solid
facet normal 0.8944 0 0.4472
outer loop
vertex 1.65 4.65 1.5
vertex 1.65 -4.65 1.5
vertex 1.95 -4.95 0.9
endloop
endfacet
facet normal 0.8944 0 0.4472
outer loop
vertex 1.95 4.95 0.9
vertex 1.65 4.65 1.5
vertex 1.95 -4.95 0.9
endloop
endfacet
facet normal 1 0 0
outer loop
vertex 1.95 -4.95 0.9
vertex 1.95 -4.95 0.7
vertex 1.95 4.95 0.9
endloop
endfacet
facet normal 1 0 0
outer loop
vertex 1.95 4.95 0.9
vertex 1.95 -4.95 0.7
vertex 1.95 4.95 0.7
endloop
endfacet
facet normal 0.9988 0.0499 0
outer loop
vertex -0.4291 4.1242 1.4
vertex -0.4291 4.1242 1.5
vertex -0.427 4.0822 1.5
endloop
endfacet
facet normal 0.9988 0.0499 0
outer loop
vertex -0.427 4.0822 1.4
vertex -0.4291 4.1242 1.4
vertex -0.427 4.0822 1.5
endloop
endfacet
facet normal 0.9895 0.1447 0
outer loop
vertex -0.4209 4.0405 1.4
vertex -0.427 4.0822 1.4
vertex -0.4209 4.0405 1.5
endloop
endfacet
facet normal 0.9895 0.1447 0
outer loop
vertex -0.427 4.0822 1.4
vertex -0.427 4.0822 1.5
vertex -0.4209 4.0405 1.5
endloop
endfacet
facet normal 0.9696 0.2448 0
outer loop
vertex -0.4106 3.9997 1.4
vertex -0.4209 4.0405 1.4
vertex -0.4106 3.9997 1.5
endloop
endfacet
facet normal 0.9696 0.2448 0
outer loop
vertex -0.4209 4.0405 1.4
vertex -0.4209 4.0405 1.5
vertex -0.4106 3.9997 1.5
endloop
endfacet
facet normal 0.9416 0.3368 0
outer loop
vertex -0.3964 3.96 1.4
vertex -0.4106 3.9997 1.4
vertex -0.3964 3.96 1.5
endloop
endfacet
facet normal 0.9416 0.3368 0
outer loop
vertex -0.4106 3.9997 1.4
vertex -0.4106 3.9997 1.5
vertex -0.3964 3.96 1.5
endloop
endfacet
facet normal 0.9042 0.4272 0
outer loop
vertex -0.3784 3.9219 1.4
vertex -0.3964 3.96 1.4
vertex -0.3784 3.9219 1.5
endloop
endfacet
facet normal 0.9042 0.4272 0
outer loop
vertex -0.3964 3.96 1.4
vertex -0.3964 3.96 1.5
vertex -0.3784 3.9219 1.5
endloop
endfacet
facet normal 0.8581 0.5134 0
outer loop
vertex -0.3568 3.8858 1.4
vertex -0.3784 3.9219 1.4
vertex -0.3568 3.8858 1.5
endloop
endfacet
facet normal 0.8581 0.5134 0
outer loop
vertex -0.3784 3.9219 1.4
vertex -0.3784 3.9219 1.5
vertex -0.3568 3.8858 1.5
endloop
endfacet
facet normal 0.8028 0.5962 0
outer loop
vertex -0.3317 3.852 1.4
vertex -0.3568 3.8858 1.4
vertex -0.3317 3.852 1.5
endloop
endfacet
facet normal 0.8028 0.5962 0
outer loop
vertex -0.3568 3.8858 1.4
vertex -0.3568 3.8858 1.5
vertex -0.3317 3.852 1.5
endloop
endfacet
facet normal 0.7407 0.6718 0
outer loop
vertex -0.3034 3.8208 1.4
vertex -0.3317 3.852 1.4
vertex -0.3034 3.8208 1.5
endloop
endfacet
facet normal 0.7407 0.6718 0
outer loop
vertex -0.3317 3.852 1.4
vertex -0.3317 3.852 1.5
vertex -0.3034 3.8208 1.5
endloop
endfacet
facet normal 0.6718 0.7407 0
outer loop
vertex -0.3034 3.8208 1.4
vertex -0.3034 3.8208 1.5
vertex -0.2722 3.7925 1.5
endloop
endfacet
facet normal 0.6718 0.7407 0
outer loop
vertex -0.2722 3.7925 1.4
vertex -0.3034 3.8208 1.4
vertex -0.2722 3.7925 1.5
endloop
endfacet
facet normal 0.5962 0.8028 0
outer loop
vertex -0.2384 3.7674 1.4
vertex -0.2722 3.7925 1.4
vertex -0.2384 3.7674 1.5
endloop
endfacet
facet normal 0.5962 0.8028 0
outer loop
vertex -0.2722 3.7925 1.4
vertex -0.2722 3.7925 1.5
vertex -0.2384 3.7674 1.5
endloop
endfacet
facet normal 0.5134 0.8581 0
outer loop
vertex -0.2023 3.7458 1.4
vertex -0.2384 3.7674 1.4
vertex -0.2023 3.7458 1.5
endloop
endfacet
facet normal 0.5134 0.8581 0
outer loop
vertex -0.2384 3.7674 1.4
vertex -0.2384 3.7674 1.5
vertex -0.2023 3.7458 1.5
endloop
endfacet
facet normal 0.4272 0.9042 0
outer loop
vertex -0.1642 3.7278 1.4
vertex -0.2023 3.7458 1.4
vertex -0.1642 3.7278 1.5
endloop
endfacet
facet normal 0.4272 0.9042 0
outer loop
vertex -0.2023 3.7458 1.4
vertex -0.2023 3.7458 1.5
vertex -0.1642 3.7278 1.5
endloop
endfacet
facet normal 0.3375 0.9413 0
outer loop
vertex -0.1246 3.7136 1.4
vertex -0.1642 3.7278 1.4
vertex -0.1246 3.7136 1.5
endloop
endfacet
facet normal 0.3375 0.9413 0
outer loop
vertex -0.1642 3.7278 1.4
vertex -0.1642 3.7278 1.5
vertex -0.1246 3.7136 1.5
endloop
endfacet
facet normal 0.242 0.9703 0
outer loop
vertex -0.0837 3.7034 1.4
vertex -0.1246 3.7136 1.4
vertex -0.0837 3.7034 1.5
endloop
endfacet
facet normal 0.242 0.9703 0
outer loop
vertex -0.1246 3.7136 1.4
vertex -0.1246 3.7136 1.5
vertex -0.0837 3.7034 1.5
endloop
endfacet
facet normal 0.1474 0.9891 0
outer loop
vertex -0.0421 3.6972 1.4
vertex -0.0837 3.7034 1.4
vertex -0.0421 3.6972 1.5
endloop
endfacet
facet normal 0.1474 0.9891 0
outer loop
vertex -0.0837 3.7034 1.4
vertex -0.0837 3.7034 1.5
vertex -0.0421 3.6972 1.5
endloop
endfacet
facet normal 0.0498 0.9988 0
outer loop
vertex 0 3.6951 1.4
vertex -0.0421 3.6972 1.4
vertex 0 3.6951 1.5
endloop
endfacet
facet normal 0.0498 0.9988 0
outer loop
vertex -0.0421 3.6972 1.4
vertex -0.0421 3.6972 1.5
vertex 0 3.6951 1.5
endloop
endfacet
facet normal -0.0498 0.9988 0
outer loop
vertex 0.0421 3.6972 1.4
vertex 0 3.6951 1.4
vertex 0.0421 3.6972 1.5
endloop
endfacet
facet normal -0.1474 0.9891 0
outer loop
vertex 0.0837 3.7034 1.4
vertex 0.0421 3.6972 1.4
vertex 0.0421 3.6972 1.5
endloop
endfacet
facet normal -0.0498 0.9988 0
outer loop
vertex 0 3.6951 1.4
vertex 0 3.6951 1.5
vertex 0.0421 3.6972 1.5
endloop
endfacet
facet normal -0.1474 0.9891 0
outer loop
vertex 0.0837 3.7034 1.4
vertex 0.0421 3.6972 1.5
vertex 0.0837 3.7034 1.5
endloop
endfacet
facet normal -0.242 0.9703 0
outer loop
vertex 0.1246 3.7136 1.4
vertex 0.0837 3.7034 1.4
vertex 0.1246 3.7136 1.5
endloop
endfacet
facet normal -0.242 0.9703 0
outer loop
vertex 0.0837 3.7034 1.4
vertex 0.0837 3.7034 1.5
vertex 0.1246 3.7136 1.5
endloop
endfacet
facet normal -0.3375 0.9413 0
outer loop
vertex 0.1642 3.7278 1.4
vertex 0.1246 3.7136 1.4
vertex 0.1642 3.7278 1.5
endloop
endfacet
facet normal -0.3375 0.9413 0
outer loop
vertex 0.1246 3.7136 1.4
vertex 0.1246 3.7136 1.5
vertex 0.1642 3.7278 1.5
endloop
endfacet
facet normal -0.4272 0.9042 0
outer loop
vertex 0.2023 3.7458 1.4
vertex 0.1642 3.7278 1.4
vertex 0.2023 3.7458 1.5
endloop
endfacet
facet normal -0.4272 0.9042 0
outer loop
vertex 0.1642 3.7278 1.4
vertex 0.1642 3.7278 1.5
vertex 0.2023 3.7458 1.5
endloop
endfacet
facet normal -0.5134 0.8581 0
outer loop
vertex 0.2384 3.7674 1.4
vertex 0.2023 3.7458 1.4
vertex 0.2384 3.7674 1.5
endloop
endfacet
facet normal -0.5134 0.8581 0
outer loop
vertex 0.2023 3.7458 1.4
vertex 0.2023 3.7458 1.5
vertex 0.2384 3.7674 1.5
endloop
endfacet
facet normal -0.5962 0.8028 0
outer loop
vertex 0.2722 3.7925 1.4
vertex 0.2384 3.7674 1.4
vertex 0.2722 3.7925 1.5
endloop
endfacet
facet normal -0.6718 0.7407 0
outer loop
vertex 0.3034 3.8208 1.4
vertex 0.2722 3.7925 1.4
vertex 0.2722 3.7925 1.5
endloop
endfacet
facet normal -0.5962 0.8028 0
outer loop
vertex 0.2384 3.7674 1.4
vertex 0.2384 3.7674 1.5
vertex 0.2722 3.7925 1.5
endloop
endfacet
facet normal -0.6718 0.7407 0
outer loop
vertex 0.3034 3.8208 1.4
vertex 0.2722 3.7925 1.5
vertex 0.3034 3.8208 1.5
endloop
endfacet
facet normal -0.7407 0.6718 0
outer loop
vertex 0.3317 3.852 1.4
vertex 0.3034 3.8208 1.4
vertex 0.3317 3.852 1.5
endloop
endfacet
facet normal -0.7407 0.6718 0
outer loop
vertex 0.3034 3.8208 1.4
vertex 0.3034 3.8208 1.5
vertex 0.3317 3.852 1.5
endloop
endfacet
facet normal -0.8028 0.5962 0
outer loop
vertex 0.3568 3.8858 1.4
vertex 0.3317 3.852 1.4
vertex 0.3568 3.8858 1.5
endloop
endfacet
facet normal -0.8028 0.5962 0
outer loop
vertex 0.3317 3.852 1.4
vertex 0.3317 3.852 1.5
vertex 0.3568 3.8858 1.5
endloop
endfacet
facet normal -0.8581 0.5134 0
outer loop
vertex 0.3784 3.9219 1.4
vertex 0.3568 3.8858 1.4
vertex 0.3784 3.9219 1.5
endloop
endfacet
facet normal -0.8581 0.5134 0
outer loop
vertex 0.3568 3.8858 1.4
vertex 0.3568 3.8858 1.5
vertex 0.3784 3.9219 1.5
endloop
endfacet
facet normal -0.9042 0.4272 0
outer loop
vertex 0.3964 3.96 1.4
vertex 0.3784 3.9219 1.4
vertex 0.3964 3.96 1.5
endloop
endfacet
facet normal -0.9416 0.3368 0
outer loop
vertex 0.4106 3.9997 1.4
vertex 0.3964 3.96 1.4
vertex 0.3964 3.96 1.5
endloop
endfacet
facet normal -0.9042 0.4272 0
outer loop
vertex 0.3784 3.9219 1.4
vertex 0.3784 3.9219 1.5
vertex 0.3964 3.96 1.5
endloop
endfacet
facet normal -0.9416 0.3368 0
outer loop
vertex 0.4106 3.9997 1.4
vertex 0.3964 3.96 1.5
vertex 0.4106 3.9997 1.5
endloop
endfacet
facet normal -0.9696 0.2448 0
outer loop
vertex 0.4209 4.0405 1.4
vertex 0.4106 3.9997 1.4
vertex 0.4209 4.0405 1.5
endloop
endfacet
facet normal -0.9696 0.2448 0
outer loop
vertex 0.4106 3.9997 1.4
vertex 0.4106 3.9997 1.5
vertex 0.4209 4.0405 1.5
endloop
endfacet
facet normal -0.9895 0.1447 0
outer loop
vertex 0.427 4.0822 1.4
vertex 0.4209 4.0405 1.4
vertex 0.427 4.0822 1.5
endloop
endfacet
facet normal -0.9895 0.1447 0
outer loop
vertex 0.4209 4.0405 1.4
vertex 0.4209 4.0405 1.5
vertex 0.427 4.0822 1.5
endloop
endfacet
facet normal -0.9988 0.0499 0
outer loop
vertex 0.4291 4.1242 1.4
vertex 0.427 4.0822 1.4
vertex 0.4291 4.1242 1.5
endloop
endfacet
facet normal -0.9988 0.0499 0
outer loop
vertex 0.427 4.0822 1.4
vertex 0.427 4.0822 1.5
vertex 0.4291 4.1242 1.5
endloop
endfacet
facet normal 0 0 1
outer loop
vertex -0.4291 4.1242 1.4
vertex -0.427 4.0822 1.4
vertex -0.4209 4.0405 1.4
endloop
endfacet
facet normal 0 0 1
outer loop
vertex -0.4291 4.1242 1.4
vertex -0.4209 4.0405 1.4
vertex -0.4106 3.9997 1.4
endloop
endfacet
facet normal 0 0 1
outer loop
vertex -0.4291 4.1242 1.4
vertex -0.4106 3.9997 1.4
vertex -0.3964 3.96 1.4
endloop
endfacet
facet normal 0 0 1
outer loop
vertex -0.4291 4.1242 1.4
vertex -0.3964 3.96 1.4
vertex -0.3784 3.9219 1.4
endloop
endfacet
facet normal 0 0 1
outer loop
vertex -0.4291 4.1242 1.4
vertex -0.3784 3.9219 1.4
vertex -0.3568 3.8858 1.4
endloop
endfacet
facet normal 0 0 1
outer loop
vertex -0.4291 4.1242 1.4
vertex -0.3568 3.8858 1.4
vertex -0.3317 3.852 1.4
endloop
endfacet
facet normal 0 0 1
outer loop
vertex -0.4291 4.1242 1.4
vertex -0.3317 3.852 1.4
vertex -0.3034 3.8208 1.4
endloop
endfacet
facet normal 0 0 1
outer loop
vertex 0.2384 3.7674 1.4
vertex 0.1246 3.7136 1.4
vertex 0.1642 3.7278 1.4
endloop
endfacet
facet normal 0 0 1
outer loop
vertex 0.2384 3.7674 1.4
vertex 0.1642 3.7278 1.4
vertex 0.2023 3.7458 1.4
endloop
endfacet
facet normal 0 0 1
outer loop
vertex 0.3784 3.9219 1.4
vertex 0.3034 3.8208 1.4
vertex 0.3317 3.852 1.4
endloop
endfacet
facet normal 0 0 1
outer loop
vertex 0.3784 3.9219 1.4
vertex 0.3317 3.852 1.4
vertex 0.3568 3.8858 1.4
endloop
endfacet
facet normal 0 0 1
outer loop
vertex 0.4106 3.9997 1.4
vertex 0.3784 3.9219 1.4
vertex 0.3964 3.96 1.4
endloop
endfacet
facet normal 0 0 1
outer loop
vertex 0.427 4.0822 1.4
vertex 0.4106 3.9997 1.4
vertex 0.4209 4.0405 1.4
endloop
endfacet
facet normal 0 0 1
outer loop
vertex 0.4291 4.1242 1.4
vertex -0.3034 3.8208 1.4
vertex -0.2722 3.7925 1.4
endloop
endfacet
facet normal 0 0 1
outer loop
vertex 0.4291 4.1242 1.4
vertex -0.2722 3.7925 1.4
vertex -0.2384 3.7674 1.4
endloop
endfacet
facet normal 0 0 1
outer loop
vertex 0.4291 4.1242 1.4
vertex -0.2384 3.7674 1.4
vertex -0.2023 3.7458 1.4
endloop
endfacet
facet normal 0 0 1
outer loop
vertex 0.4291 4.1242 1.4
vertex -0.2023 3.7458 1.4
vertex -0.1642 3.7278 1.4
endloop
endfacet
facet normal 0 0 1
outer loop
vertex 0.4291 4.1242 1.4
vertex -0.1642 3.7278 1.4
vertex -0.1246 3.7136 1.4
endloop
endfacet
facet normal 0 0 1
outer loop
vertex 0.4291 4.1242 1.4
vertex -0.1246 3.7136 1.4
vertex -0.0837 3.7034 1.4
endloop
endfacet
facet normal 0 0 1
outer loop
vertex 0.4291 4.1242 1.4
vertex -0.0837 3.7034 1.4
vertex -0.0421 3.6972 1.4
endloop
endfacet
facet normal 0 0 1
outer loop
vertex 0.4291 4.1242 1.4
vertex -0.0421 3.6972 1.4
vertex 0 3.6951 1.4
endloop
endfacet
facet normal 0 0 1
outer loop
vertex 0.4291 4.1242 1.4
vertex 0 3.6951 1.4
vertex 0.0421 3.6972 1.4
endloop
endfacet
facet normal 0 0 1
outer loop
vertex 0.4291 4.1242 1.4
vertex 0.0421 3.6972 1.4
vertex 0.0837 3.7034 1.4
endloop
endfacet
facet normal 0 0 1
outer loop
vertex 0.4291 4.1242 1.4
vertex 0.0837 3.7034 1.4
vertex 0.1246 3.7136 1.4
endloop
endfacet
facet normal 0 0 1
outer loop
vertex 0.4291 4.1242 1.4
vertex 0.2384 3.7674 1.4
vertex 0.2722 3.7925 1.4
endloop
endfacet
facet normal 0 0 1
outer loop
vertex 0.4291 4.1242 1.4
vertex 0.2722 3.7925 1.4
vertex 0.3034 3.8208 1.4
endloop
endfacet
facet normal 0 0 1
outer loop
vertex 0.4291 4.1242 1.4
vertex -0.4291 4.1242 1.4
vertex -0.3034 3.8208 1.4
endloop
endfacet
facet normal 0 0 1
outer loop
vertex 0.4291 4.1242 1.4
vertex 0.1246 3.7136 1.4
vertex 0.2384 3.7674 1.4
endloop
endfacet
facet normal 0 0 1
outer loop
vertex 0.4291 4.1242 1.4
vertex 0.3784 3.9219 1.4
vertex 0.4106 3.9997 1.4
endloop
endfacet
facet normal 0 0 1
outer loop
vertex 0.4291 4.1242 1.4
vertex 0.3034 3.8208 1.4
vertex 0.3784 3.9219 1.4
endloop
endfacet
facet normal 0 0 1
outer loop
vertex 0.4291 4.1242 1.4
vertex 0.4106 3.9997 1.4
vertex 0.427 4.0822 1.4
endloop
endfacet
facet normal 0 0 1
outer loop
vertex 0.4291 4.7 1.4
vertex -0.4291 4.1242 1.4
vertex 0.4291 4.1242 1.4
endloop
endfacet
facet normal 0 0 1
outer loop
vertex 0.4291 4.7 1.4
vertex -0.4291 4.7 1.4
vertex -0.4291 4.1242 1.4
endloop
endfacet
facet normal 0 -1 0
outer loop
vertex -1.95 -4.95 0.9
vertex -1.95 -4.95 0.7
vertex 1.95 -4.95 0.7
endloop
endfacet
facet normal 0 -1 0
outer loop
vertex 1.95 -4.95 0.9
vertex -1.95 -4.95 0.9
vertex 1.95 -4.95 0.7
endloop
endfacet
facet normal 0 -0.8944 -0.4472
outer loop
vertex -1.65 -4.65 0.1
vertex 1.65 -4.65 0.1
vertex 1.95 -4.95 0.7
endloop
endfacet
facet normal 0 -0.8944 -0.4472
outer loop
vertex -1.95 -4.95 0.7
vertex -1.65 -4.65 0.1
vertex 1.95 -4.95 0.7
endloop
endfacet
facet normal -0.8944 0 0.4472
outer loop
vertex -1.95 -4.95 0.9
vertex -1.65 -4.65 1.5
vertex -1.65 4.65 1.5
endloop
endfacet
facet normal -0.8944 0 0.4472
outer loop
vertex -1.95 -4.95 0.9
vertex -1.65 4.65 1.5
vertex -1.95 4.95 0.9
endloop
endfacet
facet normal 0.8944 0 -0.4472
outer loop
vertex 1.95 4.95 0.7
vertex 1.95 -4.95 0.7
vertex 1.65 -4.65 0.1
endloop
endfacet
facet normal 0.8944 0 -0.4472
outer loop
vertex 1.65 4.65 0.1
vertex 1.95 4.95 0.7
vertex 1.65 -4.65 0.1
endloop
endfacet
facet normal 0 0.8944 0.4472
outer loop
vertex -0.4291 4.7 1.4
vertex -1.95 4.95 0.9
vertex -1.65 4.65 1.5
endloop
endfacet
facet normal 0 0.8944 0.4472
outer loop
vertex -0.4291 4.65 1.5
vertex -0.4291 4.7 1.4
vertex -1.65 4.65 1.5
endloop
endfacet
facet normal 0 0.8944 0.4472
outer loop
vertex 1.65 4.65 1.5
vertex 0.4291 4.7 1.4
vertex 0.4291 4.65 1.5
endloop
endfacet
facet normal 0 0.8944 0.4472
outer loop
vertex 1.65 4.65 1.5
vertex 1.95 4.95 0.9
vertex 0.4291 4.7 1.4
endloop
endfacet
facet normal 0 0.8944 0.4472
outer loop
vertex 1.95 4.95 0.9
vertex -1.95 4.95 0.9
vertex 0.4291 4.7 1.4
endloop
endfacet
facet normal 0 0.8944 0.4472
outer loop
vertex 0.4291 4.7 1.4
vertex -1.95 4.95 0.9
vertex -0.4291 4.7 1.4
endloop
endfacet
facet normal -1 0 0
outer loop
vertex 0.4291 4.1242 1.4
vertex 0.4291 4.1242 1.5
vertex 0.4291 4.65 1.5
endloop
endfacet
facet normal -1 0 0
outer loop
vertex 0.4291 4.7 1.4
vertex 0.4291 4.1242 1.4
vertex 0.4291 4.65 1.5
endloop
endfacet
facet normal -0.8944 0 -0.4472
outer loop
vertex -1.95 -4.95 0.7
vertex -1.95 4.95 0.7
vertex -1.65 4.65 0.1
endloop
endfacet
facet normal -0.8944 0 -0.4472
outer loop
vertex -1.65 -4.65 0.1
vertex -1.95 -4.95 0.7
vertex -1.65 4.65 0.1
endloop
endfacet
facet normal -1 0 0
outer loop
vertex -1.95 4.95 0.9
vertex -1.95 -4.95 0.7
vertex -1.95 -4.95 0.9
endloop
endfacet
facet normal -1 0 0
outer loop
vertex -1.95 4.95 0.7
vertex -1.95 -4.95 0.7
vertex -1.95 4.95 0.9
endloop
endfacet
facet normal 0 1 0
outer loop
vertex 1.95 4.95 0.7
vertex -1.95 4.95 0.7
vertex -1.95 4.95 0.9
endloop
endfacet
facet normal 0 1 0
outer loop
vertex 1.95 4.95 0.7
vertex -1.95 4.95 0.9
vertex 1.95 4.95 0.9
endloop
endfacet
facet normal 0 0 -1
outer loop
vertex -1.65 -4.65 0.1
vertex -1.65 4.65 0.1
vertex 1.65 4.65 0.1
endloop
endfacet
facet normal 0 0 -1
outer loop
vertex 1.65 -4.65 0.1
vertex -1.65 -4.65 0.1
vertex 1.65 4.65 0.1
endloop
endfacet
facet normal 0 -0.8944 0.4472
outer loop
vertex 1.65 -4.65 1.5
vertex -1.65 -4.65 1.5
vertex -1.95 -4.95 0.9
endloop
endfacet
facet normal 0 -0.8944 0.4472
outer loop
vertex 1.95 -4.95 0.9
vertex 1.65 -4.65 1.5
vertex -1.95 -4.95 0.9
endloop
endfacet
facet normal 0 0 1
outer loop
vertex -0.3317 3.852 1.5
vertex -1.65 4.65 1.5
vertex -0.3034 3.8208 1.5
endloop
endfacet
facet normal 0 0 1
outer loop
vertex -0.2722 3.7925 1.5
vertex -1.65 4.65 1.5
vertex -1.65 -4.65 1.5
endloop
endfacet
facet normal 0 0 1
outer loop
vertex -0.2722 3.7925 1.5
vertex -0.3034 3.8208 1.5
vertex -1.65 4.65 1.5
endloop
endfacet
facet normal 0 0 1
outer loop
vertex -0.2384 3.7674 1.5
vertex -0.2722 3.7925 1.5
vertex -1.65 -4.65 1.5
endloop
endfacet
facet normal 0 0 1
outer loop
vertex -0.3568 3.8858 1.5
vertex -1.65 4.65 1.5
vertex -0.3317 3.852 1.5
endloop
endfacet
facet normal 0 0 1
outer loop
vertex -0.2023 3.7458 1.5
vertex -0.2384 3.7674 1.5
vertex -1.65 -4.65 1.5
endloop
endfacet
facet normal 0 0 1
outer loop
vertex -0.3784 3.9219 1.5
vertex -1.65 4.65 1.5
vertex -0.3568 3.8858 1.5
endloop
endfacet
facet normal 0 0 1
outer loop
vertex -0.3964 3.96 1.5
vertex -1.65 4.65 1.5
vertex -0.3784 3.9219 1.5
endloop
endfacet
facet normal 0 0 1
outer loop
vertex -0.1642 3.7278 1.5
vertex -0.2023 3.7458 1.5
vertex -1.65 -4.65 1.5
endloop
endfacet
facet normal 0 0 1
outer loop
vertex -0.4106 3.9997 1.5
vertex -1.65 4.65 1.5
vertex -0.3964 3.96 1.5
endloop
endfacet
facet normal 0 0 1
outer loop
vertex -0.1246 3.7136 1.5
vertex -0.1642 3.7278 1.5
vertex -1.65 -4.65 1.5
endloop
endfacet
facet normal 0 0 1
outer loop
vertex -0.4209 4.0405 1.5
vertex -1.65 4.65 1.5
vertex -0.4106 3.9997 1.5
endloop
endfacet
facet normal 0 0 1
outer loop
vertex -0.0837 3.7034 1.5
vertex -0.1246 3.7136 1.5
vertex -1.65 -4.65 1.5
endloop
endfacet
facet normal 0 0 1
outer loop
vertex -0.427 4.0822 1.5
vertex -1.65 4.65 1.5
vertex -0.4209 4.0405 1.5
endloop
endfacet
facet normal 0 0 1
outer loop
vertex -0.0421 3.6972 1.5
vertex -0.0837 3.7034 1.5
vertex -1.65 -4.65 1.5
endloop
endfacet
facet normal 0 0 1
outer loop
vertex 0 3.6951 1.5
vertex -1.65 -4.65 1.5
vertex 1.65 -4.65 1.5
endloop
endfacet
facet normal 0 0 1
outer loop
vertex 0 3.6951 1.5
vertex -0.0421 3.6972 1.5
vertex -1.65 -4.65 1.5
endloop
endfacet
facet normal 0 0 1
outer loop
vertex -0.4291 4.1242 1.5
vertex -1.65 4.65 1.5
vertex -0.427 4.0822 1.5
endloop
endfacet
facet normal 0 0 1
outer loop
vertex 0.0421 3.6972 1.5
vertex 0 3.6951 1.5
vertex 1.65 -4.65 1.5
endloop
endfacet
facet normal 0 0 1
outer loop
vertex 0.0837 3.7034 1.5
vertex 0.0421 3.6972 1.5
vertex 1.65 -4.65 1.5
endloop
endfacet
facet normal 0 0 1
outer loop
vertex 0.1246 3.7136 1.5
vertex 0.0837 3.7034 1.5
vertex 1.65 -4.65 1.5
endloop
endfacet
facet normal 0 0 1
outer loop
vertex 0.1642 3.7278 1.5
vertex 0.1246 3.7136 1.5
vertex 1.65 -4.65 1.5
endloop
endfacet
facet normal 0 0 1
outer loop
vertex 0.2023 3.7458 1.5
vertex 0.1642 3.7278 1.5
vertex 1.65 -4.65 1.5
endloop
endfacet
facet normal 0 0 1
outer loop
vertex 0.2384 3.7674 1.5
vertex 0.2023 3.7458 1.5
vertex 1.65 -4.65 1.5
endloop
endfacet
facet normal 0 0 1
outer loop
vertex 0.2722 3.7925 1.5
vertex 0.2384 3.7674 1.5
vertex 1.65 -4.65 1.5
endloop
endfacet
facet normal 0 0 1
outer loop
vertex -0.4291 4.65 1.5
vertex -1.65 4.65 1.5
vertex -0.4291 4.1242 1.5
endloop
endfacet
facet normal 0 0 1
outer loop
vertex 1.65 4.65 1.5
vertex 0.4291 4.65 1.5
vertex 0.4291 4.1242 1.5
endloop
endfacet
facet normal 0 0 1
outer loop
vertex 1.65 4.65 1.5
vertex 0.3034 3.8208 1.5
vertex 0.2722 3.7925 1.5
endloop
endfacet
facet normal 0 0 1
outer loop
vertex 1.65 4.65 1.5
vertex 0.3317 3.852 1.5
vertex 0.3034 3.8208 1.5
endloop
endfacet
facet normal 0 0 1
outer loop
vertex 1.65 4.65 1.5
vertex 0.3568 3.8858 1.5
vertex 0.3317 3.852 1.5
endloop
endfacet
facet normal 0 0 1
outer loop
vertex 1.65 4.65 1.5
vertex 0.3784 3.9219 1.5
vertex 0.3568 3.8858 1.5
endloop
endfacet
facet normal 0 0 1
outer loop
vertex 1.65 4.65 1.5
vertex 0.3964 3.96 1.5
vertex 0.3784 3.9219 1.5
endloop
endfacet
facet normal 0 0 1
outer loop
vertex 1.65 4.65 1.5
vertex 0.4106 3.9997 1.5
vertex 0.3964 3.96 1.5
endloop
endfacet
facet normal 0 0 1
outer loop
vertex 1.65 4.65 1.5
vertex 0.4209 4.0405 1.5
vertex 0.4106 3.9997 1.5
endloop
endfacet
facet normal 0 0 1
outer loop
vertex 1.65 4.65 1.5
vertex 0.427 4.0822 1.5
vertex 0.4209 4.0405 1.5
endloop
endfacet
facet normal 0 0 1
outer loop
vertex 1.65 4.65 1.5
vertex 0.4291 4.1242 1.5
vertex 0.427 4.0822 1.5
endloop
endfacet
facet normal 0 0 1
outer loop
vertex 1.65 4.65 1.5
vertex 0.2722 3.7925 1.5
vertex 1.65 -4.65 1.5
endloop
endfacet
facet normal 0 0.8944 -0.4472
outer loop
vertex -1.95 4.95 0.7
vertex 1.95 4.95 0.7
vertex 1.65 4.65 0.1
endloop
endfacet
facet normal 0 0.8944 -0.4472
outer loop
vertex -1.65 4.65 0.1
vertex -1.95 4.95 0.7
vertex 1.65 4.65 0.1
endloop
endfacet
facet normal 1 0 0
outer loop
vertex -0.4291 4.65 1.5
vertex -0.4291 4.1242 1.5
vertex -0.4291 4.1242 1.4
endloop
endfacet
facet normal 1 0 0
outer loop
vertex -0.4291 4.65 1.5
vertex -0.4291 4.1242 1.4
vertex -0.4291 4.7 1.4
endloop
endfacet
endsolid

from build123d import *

# Parameters (mm, degrees)
SKETCH_W        = 3.9
SKETCH_H        = 9.9
PAD_DEPTH       = 1.4
POCKET_DEPTH    = 9.901
POCKET001_DEPTH = 3.901
POCKET002_DEPTH = 0.1


with BuildPart() as part:
    # Sketch → Pad (new body)
    with BuildSketch(Plane.XY):
        Rectangle(SKETCH_W, SKETCH_H)
    extrude(amount=PAD_DEPTH)

    # Sketch001 (on Face3 of Pad) → Pocket (cut, through all)
    with BuildSketch(Plane.XZ.offset(4.95)):
        Polygon((-1.95, 0.6), (-1.65, 0), (-1.95, 0), align=None)
        Polygon((1.65, 0), (1.95, 0), (1.95, 0.6), align=None)
        Polygon((1.95, 1.4), (1.65, 1.4), (1.95, 0.8), align=None)
        Polygon((-1.95, 1.4), (-1.65, 1.4), (-1.95, 0.8), align=None)
    extrude(amount=-POCKET_DEPTH, mode=Mode.SUBTRACT)

    # Sketch002 (on Face5 of Pocket) → Pocket001 (cut, through all)
    with BuildSketch(Plane.YZ.offset(1.95)):
        Polygon((4.95, 0.8), (4.65, 1.4), (4.95, 1.4), align=None)
        Polygon((4.95, 0.6), (4.65, 0), (4.95, 0), align=None)
        Polygon((-4.95, 0.8), (-4.95, 1.4), (-4.65, 1.4), align=None)
        Polygon((-4.95, 0.6), (-4.95, 0), (-4.65, 0), align=None)
    extrude(amount=-POCKET001_DEPTH, mode=Mode.SUBTRACT)

    # Sketch003 (on Face11 of Pocket001) → Pocket002 (cut)
    with BuildSketch(Plane.XY.offset(1.4)):
        with BuildLine():
            ThreePointArc((-0.429098, 4.124211), (0, 3.695113), (0.429098, 4.124211))
            Line((0.429098, 4.124211), (0.429098, 5.299881))
            ThreePointArc((0.429098, 5.299881), (0, 5.728979), (-0.429098, 5.299881))
            Line((-0.429098, 4.124211), (-0.429098, 5.299881))
        make_face()
    extrude(amount=-POCKET002_DEPTH, mode=Mode.SUBTRACT)


with BuildPart() as part_1:
    # Body placement: moved
    add(part.part.moved(Location((0, 0, 0.1))))


solid = part_1.part
